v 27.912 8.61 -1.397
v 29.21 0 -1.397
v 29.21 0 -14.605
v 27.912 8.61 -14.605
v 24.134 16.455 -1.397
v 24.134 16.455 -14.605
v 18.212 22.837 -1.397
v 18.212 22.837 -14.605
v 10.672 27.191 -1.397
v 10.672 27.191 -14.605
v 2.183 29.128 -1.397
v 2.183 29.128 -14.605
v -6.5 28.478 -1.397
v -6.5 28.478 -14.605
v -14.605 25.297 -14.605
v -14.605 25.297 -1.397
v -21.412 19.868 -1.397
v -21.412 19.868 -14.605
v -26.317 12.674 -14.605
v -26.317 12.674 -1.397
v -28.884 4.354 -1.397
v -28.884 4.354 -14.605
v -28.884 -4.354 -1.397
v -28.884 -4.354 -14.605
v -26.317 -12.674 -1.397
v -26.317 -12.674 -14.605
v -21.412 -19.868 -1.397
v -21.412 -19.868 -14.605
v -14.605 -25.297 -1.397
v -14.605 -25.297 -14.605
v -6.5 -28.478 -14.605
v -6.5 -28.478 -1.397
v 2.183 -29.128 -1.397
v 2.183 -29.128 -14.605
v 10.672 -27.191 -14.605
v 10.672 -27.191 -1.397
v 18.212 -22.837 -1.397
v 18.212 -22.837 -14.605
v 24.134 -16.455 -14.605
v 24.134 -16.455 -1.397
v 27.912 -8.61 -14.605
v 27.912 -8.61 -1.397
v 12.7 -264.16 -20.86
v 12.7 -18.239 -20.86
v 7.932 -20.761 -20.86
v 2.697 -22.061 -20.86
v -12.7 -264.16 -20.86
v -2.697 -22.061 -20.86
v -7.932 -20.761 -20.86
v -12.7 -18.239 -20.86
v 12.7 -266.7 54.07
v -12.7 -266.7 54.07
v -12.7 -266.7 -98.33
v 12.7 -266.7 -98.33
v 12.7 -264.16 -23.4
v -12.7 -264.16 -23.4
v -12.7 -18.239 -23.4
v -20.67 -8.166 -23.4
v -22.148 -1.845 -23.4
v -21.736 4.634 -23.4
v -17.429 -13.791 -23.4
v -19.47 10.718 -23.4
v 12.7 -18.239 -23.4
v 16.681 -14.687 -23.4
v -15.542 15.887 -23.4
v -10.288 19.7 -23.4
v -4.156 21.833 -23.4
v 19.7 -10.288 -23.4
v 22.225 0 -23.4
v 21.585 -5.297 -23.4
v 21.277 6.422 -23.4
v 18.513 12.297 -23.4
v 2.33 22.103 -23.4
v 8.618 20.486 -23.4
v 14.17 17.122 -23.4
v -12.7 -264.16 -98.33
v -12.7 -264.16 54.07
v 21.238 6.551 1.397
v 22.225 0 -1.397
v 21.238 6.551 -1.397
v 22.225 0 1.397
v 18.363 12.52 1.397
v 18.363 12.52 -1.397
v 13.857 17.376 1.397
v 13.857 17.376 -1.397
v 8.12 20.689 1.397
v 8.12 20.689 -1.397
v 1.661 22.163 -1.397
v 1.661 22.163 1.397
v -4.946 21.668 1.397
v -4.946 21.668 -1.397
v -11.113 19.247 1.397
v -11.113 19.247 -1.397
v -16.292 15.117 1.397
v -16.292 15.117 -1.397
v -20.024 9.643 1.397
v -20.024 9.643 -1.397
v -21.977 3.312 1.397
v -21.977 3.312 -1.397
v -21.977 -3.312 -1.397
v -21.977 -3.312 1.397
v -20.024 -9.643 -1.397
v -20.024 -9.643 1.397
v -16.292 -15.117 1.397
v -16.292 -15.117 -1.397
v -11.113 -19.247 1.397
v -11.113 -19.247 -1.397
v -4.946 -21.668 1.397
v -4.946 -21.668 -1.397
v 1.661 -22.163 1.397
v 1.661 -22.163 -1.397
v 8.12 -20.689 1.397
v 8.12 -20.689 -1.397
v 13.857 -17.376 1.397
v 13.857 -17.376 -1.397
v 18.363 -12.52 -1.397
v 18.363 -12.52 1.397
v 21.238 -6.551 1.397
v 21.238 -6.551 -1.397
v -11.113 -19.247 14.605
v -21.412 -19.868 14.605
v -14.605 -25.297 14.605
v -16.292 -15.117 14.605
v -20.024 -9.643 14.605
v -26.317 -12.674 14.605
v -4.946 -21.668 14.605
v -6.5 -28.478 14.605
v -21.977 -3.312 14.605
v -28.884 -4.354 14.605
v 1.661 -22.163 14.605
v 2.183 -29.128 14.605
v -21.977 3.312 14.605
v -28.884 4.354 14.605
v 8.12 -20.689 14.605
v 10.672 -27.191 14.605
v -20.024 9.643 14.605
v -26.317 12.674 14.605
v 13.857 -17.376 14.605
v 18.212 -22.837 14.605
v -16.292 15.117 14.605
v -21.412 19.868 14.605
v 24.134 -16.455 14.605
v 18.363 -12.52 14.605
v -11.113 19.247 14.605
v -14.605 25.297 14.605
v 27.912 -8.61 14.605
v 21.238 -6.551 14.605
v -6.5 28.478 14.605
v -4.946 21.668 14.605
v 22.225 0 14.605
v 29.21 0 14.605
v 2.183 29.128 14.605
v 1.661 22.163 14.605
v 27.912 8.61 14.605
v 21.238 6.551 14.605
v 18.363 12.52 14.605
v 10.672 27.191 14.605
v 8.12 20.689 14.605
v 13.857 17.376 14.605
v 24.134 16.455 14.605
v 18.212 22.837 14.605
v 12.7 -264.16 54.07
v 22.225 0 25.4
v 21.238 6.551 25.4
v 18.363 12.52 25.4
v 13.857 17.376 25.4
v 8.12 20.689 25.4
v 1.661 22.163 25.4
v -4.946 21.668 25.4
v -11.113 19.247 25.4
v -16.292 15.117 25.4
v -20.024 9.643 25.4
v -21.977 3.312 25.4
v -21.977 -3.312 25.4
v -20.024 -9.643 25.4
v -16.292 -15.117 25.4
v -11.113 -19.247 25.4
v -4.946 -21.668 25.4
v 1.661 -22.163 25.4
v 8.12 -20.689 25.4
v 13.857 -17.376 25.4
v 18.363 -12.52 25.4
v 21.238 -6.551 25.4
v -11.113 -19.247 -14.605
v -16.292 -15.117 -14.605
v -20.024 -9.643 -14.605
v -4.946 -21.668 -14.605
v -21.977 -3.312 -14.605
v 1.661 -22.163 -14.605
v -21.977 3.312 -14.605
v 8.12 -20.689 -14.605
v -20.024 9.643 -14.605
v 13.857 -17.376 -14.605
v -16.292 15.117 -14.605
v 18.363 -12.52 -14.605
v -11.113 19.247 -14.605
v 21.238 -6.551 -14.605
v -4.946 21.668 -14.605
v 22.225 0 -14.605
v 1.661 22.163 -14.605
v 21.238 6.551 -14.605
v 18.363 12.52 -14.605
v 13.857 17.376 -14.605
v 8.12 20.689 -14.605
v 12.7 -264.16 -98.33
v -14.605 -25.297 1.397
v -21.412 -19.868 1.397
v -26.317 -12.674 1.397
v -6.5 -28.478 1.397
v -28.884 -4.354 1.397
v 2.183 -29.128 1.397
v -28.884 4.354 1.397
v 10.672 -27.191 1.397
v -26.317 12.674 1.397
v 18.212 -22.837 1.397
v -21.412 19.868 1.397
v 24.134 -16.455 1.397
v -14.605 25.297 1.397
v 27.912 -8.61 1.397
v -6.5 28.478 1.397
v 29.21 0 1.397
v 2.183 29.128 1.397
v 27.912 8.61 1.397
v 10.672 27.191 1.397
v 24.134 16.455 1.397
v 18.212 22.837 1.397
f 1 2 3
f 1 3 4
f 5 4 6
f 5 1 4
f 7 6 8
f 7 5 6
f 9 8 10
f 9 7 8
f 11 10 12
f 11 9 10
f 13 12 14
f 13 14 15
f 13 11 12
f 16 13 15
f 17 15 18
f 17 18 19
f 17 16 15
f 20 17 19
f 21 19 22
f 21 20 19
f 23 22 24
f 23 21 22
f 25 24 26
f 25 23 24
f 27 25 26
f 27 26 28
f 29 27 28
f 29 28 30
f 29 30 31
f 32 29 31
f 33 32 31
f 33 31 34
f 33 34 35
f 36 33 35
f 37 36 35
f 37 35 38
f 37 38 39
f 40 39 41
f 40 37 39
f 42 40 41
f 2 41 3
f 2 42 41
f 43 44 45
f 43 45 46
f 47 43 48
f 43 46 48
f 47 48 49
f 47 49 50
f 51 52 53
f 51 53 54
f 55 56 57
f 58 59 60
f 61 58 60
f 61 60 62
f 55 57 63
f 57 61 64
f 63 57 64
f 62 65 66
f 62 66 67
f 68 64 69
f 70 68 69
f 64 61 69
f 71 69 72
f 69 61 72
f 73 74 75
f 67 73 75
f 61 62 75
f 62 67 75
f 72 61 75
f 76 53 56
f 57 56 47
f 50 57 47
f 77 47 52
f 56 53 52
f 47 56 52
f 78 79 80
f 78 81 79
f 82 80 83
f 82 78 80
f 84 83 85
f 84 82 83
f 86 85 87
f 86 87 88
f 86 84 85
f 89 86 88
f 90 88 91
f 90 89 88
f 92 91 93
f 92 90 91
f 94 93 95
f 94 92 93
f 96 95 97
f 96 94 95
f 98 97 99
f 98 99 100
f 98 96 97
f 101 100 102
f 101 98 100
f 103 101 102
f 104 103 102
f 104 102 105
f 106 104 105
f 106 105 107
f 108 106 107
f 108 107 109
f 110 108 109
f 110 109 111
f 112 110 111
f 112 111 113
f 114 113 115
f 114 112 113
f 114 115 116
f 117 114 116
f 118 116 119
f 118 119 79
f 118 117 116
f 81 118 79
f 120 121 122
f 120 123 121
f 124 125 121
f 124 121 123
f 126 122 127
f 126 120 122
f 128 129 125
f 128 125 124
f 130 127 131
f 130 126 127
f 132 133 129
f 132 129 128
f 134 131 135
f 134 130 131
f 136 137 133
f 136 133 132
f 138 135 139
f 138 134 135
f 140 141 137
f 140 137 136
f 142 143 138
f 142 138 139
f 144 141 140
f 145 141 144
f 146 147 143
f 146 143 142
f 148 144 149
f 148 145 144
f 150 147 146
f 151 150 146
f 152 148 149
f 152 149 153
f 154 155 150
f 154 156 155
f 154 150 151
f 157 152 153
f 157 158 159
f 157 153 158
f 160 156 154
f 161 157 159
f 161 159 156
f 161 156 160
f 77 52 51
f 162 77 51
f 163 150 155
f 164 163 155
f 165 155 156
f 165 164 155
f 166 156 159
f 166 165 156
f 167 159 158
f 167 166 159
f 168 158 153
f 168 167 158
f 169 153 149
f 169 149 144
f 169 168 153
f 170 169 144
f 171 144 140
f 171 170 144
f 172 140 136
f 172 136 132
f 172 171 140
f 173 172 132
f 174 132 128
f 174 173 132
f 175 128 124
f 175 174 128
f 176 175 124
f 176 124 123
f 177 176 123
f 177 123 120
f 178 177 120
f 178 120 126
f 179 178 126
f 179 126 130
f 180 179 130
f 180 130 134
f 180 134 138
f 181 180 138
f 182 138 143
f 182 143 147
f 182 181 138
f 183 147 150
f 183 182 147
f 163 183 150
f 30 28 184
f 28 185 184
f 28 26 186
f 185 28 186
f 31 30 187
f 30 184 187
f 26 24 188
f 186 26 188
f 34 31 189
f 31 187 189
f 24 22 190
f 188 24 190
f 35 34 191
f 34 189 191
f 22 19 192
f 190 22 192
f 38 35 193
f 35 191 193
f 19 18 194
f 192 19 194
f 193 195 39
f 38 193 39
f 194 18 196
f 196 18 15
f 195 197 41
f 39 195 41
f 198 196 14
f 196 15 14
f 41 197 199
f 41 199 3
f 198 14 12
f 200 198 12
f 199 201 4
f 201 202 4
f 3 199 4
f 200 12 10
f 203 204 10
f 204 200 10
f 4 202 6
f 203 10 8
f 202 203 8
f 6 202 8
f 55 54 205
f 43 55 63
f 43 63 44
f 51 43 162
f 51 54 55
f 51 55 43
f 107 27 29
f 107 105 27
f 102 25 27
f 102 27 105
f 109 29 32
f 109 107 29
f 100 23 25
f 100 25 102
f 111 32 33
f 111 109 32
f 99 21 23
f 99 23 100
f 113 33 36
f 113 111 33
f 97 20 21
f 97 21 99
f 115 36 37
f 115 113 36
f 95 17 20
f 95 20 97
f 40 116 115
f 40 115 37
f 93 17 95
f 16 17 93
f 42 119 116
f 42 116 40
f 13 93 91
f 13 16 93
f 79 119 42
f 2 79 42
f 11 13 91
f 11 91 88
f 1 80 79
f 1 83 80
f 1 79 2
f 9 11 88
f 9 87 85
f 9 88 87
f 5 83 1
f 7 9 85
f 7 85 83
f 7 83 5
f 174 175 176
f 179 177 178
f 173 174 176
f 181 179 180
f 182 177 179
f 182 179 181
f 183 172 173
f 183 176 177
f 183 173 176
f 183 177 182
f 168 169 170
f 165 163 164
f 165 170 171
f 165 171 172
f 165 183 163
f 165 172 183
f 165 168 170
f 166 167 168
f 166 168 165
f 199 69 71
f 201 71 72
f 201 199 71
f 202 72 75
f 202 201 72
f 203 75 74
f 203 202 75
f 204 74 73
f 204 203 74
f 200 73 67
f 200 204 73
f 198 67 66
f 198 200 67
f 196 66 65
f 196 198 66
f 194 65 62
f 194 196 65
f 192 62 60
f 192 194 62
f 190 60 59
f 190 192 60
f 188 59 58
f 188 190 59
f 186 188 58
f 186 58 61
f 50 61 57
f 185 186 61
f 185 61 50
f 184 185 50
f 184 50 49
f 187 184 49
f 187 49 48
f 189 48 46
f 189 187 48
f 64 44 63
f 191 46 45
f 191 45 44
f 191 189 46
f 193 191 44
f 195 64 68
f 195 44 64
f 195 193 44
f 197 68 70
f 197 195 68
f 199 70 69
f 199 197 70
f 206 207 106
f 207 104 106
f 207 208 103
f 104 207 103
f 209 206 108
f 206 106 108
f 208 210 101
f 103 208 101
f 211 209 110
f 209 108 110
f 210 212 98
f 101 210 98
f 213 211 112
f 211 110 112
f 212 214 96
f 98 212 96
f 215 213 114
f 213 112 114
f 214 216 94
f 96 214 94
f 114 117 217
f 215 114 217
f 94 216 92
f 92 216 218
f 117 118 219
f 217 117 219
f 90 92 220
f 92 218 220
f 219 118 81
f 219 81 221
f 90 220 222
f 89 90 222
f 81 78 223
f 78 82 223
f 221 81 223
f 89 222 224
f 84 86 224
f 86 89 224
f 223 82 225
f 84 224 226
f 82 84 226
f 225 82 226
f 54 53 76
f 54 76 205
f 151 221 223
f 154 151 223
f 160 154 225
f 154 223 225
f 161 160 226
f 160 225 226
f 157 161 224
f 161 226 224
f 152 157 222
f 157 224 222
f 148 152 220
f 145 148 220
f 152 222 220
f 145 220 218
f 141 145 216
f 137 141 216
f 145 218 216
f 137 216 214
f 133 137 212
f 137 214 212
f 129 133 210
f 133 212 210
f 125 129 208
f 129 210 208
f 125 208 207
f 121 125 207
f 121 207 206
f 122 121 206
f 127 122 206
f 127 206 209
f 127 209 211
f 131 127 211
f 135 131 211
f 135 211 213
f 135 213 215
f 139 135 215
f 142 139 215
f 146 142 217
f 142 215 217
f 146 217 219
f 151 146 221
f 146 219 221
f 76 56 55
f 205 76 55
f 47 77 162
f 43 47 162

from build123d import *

# Parameters (mm, degrees)
SKETCH1_R                = 22.225
HUB_CENTER_DEPTH         = 25.4
HUB_CENTER_DEPTH_BACK    = 23.4
INNER_START              = 1.397
SKETCH2_R                = 29.21
INNER_BEARING_DEPTH      = 13.208
OUTER_START              = -1.397
SKETCH3_R                = 29.21
OUTER_BEARING_DEPTH      = 13.208
TIRE_ARM_DEPTH           = 2.54
SKETCH5_W                = 25.4
SKETCH5_H                = 152.4
TIRE_CONTACT_PATCH_DEPTH = 2.54


with BuildPart() as part:
    # Sketch1 → Hub Center (new body, two sides)
    with BuildSketch(Plane.XY) as hub_center_sk:
        Circle(SKETCH1_R)
    extrude(amount=HUB_CENTER_DEPTH)
    extrude(hub_center_sk.sketch, amount=-HUB_CENTER_DEPTH_BACK)

    # Sketch2 → Inner Bearing (add)
    with BuildSketch(Plane.XY.offset(INNER_START)):
        Circle(SKETCH2_R)
    extrude(amount=INNER_BEARING_DEPTH)

    # Sketch3 → Outer Bearing (add)
    with BuildSketch(Plane.XY.offset(OUTER_START)):
        Circle(SKETCH3_R)
    extrude(amount=-OUTER_BEARING_DEPTH)

    # Sketch4 → Tire Arm (add)
    with BuildSketch(Plane(origin=(0, 0, -23.4), x_dir=(-1, 0, 0), z_dir=(0, 0, -1))):
        with BuildLine():
            Line((-12.7, -18.238986403), (-12.7, -266.7))
            Line((-12.7, -266.7), (12.7, -266.7))
            Line((12.7, -266.7), (12.7, -18.238986403))
            ThreePointArc((12.7, -18.238986403), (0, -22.225), (-12.7, -18.238986403))
        make_face()
    extrude(amount=-TIRE_ARM_DEPTH)

    # Sketch5 → Tire Contact Patch (add)
    with BuildSketch(Plane.XZ.offset(266.7)):
        with Locations((0, -22.13)):
            Rectangle(SKETCH5_W, SKETCH5_H)
    extrude(amount=-TIRE_CONTACT_PATCH_DEPTH)


solid = part.part
